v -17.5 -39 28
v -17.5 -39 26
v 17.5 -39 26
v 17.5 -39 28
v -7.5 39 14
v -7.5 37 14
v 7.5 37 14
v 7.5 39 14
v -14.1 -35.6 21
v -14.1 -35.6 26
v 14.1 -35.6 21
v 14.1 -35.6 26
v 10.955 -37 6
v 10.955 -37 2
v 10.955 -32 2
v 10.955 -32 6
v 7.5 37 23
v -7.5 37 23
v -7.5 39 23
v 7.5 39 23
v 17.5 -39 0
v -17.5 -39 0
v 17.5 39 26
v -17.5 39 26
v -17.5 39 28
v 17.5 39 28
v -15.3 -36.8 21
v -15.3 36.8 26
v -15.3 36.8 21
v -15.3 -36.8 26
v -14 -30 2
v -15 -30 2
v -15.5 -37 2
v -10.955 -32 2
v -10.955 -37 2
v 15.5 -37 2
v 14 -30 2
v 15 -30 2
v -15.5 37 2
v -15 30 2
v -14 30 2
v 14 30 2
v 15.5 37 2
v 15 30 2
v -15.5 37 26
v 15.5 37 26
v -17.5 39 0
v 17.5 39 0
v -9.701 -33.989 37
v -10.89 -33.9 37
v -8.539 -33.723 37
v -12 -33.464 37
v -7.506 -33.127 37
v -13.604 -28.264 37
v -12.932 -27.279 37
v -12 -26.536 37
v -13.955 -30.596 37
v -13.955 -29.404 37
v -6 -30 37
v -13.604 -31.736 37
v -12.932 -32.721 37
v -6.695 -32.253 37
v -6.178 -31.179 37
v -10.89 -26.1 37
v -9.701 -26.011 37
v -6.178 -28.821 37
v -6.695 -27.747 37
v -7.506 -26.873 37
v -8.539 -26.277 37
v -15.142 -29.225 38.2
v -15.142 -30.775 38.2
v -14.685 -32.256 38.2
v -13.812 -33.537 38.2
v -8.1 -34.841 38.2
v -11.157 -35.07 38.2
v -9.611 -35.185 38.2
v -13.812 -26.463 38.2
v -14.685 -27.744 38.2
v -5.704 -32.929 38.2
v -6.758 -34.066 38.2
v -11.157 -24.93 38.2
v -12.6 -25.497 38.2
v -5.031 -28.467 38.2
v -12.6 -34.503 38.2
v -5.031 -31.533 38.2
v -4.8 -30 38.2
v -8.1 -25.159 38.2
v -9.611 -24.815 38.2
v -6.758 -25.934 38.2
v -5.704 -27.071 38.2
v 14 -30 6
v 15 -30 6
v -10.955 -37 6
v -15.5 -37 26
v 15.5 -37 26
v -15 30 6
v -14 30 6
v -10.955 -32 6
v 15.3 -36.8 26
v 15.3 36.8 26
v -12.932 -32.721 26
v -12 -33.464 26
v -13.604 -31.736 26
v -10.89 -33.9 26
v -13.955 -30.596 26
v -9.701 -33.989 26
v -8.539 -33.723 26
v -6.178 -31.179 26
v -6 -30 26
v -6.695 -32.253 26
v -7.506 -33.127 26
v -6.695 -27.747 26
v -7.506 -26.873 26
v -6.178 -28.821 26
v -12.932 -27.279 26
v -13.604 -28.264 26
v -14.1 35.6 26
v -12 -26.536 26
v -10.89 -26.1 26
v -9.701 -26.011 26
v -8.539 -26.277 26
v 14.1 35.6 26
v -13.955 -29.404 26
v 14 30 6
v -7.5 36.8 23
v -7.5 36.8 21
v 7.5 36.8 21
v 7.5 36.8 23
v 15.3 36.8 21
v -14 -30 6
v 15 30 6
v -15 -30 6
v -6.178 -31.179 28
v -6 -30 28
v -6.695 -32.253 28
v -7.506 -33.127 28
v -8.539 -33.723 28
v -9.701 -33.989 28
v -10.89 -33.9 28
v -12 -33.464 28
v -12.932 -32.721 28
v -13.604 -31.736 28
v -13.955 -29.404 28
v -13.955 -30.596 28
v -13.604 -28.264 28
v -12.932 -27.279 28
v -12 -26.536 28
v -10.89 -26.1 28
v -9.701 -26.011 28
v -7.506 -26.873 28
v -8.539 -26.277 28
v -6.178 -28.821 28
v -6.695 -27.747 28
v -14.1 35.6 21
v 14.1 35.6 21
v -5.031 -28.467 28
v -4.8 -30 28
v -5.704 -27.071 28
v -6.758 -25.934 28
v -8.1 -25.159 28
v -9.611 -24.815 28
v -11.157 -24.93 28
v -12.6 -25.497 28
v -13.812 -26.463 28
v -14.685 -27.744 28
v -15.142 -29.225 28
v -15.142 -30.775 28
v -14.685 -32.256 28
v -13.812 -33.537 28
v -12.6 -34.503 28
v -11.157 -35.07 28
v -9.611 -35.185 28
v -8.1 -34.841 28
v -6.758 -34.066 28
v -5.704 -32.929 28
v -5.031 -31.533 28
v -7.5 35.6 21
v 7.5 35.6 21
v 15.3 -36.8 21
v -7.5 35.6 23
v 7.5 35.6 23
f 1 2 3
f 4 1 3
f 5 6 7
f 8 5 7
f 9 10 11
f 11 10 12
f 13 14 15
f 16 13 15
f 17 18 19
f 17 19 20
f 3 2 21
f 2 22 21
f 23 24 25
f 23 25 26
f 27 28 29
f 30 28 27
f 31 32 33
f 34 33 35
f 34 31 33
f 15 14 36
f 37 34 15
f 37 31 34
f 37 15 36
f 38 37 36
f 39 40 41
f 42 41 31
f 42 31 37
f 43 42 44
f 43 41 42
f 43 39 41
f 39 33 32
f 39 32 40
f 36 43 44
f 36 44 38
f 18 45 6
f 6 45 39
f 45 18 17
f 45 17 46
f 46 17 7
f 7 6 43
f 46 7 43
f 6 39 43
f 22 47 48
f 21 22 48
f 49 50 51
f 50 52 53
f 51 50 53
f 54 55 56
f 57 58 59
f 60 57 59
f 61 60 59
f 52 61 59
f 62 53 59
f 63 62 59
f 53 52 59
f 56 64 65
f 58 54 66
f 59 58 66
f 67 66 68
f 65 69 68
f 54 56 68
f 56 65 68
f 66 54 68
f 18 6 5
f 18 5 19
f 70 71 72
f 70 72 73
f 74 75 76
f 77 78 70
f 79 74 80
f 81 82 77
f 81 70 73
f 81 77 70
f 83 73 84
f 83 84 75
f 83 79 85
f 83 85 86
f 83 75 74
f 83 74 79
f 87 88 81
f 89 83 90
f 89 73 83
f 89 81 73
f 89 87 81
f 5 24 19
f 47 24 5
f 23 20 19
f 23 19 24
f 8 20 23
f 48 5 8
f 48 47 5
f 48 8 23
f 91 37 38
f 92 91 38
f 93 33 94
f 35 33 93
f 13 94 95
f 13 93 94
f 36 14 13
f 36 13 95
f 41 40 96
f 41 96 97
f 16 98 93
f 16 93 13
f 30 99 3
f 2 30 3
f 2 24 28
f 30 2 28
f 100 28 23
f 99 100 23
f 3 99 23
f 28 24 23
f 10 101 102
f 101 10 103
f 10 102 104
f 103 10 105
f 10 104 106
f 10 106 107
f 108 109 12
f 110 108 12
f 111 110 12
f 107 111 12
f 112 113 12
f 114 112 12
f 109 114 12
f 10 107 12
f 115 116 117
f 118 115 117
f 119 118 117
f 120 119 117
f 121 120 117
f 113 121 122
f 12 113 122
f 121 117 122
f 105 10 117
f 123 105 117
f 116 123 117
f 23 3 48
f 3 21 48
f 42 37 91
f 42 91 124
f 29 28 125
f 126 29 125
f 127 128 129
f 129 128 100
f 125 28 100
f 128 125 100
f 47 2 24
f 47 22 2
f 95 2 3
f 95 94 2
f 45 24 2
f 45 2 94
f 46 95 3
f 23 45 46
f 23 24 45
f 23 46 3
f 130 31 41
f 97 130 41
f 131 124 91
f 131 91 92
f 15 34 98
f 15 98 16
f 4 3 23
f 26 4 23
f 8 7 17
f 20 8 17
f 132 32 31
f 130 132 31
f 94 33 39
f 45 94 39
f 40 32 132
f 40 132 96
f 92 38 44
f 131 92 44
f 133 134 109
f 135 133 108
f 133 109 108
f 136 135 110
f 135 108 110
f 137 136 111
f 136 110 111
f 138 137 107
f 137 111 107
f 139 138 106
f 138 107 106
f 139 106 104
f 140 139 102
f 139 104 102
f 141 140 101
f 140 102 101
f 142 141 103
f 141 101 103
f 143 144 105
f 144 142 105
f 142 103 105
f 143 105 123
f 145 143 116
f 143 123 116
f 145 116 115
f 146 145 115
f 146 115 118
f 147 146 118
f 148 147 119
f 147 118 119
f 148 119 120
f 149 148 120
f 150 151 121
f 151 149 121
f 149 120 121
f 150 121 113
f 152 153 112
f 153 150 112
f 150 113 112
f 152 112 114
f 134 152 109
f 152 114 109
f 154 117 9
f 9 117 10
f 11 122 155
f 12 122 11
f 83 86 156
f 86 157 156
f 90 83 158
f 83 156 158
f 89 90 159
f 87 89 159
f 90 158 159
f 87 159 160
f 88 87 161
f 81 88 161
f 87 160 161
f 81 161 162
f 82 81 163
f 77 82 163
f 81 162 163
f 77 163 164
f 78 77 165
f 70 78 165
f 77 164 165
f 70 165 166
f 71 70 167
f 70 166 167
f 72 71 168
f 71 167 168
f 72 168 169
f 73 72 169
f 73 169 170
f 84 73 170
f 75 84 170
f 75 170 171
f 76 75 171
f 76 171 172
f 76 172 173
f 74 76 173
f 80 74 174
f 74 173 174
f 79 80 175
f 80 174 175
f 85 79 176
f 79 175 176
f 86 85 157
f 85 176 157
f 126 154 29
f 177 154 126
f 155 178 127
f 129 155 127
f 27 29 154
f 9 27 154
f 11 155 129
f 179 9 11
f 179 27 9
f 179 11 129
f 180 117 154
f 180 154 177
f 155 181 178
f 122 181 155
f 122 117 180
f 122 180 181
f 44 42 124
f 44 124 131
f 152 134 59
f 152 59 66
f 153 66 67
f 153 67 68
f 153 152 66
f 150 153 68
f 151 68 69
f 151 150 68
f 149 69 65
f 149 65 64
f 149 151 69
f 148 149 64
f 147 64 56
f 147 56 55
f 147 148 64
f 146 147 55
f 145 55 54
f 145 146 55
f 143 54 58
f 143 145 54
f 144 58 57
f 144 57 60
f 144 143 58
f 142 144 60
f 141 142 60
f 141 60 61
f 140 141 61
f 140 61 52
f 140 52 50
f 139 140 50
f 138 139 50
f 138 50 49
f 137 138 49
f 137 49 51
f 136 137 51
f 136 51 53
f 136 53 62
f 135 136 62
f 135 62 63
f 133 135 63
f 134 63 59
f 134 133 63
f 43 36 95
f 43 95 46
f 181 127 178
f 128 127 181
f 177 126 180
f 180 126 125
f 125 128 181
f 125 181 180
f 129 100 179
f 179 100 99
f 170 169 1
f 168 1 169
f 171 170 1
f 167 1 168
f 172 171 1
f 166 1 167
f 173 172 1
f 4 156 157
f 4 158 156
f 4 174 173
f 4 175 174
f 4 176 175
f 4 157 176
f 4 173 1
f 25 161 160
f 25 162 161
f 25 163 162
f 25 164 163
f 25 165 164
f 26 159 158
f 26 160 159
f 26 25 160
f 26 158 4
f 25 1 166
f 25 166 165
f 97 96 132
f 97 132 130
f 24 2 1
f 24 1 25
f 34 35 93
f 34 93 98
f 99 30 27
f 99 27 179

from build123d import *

# Parameters (mm, degrees)
F0_W      = 35
F0_H      = 78
F1_DEPTH  = 2
F2_W      = 35
F2_H      = 78
F2_W_2    = 31
F2_H_2    = 74
F3_DEPTH  = 24
F4_W      = 1
F4_H      = 60
F4_W_2    = 21.910824
F4_H_2    = 5
F5_DEPTH  = 4
F6_W      = 15
F6_H      = 9
F7_DEPTH  = 2
F8_W      = 35
F8_H      = 78
F9_DEPTH  = 2
F10_W     = 30.6
F10_H     = 73.6
F10_W_2   = 28.2
F10_H_2   = 71.2
F11_DEPTH = 5
F12_R     = 5.2
F12_R_2   = 4
F13_DEPTH = 9
F14_R     = 5.2
F15_DEPTH = 1.2
F16_R     = 4
F17_DEPTH = 2
F18_W     = 15
F18_H     = 9
F19_DEPTH = 1.2


with BuildPart() as f1:
    # F0 (on Top) → F1 (new body)
    with BuildSketch(Plane.XY):
        Rectangle(F0_W, F0_H)
    extrude(amount=F1_DEPTH)

    # F2 (on face) → F3 (join)
    with BuildSketch(Plane.XY.offset(2)):
        Rectangle(F2_W, F2_H)
        Rectangle(F2_W_2, F2_H_2, mode=Mode.SUBTRACT)
    extrude(amount=F3_DEPTH)

    # F4 (on face) → F5 (join)
    with BuildSketch(Plane.XY.offset(2)):
        with Locations((-14.5, 0)):
            Rectangle(F4_W, F4_H)
        with Locations((14.5, 0)):
            Rectangle(F4_W, F4_H)
        with Locations((0, -34.5)):
            Rectangle(F4_W_2, F4_H_2)
    extrude(amount=F5_DEPTH)

    # F6 (on face) → F7 (cut, through all)
    with BuildSketch(Plane.XZ.offset(-37)):
        with Locations((0, 18.5)):
            Rectangle(F6_W, F6_H)
    extrude(amount=-F7_DEPTH, mode=Mode.SUBTRACT)


with BuildPart() as f9:
    # F8 (on face) → F9 (new body)
    with BuildSketch(Plane.XY.offset(26)):
        Rectangle(F8_W, F8_H)
    extrude(amount=F9_DEPTH)

    # F10 (on face) → F11 (join)
    with BuildSketch(Plane(origin=(0, 0, 26), x_dir=(1, 0, 0), z_dir=(0, 0, -1))):
        Rectangle(F10_W, F10_H)
        Rectangle(F10_W_2, F10_H_2, mode=Mode.SUBTRACT)
    extrude(amount=F11_DEPTH)

    # F12 (on face) → F13 (join)
    with BuildSketch(Plane.XY.offset(28)):
        with Locations((-10, -30)):
            Circle(F12_R)
        with Locations((-10, -30)):
            Circle(F12_R_2, mode=Mode.SUBTRACT)
    extrude(amount=F13_DEPTH)

    # F14 (on face) → F15 (join)
    with BuildSketch(Plane.XY.offset(37)):
        with Locations((-10, -30)):
            Circle(F14_R)
    extrude(amount=F15_DEPTH)

    # F16 (on face) → F17 (cut, through all)
    with BuildSketch(Plane(origin=(0, 0, 26), x_dir=(1, 0, 0), z_dir=(0, 0, -1))):
        with Locations((-10, 30)):
            Circle(F16_R)
    extrude(amount=-F17_DEPTH, mode=Mode.SUBTRACT)

    # F18 (on face) → F19 (cut, through all)
    with BuildSketch(Plane(origin=(0, 36.8, 0), x_dir=(-1, 0, 0), z_dir=(0, 1, 0))):
        with Locations((0, 18.5)):
            Rectangle(F18_W, F18_H)
    extrude(amount=-F19_DEPTH, mode=Mode.SUBTRACT)


solid = Compound([f1.part, f9.part])
